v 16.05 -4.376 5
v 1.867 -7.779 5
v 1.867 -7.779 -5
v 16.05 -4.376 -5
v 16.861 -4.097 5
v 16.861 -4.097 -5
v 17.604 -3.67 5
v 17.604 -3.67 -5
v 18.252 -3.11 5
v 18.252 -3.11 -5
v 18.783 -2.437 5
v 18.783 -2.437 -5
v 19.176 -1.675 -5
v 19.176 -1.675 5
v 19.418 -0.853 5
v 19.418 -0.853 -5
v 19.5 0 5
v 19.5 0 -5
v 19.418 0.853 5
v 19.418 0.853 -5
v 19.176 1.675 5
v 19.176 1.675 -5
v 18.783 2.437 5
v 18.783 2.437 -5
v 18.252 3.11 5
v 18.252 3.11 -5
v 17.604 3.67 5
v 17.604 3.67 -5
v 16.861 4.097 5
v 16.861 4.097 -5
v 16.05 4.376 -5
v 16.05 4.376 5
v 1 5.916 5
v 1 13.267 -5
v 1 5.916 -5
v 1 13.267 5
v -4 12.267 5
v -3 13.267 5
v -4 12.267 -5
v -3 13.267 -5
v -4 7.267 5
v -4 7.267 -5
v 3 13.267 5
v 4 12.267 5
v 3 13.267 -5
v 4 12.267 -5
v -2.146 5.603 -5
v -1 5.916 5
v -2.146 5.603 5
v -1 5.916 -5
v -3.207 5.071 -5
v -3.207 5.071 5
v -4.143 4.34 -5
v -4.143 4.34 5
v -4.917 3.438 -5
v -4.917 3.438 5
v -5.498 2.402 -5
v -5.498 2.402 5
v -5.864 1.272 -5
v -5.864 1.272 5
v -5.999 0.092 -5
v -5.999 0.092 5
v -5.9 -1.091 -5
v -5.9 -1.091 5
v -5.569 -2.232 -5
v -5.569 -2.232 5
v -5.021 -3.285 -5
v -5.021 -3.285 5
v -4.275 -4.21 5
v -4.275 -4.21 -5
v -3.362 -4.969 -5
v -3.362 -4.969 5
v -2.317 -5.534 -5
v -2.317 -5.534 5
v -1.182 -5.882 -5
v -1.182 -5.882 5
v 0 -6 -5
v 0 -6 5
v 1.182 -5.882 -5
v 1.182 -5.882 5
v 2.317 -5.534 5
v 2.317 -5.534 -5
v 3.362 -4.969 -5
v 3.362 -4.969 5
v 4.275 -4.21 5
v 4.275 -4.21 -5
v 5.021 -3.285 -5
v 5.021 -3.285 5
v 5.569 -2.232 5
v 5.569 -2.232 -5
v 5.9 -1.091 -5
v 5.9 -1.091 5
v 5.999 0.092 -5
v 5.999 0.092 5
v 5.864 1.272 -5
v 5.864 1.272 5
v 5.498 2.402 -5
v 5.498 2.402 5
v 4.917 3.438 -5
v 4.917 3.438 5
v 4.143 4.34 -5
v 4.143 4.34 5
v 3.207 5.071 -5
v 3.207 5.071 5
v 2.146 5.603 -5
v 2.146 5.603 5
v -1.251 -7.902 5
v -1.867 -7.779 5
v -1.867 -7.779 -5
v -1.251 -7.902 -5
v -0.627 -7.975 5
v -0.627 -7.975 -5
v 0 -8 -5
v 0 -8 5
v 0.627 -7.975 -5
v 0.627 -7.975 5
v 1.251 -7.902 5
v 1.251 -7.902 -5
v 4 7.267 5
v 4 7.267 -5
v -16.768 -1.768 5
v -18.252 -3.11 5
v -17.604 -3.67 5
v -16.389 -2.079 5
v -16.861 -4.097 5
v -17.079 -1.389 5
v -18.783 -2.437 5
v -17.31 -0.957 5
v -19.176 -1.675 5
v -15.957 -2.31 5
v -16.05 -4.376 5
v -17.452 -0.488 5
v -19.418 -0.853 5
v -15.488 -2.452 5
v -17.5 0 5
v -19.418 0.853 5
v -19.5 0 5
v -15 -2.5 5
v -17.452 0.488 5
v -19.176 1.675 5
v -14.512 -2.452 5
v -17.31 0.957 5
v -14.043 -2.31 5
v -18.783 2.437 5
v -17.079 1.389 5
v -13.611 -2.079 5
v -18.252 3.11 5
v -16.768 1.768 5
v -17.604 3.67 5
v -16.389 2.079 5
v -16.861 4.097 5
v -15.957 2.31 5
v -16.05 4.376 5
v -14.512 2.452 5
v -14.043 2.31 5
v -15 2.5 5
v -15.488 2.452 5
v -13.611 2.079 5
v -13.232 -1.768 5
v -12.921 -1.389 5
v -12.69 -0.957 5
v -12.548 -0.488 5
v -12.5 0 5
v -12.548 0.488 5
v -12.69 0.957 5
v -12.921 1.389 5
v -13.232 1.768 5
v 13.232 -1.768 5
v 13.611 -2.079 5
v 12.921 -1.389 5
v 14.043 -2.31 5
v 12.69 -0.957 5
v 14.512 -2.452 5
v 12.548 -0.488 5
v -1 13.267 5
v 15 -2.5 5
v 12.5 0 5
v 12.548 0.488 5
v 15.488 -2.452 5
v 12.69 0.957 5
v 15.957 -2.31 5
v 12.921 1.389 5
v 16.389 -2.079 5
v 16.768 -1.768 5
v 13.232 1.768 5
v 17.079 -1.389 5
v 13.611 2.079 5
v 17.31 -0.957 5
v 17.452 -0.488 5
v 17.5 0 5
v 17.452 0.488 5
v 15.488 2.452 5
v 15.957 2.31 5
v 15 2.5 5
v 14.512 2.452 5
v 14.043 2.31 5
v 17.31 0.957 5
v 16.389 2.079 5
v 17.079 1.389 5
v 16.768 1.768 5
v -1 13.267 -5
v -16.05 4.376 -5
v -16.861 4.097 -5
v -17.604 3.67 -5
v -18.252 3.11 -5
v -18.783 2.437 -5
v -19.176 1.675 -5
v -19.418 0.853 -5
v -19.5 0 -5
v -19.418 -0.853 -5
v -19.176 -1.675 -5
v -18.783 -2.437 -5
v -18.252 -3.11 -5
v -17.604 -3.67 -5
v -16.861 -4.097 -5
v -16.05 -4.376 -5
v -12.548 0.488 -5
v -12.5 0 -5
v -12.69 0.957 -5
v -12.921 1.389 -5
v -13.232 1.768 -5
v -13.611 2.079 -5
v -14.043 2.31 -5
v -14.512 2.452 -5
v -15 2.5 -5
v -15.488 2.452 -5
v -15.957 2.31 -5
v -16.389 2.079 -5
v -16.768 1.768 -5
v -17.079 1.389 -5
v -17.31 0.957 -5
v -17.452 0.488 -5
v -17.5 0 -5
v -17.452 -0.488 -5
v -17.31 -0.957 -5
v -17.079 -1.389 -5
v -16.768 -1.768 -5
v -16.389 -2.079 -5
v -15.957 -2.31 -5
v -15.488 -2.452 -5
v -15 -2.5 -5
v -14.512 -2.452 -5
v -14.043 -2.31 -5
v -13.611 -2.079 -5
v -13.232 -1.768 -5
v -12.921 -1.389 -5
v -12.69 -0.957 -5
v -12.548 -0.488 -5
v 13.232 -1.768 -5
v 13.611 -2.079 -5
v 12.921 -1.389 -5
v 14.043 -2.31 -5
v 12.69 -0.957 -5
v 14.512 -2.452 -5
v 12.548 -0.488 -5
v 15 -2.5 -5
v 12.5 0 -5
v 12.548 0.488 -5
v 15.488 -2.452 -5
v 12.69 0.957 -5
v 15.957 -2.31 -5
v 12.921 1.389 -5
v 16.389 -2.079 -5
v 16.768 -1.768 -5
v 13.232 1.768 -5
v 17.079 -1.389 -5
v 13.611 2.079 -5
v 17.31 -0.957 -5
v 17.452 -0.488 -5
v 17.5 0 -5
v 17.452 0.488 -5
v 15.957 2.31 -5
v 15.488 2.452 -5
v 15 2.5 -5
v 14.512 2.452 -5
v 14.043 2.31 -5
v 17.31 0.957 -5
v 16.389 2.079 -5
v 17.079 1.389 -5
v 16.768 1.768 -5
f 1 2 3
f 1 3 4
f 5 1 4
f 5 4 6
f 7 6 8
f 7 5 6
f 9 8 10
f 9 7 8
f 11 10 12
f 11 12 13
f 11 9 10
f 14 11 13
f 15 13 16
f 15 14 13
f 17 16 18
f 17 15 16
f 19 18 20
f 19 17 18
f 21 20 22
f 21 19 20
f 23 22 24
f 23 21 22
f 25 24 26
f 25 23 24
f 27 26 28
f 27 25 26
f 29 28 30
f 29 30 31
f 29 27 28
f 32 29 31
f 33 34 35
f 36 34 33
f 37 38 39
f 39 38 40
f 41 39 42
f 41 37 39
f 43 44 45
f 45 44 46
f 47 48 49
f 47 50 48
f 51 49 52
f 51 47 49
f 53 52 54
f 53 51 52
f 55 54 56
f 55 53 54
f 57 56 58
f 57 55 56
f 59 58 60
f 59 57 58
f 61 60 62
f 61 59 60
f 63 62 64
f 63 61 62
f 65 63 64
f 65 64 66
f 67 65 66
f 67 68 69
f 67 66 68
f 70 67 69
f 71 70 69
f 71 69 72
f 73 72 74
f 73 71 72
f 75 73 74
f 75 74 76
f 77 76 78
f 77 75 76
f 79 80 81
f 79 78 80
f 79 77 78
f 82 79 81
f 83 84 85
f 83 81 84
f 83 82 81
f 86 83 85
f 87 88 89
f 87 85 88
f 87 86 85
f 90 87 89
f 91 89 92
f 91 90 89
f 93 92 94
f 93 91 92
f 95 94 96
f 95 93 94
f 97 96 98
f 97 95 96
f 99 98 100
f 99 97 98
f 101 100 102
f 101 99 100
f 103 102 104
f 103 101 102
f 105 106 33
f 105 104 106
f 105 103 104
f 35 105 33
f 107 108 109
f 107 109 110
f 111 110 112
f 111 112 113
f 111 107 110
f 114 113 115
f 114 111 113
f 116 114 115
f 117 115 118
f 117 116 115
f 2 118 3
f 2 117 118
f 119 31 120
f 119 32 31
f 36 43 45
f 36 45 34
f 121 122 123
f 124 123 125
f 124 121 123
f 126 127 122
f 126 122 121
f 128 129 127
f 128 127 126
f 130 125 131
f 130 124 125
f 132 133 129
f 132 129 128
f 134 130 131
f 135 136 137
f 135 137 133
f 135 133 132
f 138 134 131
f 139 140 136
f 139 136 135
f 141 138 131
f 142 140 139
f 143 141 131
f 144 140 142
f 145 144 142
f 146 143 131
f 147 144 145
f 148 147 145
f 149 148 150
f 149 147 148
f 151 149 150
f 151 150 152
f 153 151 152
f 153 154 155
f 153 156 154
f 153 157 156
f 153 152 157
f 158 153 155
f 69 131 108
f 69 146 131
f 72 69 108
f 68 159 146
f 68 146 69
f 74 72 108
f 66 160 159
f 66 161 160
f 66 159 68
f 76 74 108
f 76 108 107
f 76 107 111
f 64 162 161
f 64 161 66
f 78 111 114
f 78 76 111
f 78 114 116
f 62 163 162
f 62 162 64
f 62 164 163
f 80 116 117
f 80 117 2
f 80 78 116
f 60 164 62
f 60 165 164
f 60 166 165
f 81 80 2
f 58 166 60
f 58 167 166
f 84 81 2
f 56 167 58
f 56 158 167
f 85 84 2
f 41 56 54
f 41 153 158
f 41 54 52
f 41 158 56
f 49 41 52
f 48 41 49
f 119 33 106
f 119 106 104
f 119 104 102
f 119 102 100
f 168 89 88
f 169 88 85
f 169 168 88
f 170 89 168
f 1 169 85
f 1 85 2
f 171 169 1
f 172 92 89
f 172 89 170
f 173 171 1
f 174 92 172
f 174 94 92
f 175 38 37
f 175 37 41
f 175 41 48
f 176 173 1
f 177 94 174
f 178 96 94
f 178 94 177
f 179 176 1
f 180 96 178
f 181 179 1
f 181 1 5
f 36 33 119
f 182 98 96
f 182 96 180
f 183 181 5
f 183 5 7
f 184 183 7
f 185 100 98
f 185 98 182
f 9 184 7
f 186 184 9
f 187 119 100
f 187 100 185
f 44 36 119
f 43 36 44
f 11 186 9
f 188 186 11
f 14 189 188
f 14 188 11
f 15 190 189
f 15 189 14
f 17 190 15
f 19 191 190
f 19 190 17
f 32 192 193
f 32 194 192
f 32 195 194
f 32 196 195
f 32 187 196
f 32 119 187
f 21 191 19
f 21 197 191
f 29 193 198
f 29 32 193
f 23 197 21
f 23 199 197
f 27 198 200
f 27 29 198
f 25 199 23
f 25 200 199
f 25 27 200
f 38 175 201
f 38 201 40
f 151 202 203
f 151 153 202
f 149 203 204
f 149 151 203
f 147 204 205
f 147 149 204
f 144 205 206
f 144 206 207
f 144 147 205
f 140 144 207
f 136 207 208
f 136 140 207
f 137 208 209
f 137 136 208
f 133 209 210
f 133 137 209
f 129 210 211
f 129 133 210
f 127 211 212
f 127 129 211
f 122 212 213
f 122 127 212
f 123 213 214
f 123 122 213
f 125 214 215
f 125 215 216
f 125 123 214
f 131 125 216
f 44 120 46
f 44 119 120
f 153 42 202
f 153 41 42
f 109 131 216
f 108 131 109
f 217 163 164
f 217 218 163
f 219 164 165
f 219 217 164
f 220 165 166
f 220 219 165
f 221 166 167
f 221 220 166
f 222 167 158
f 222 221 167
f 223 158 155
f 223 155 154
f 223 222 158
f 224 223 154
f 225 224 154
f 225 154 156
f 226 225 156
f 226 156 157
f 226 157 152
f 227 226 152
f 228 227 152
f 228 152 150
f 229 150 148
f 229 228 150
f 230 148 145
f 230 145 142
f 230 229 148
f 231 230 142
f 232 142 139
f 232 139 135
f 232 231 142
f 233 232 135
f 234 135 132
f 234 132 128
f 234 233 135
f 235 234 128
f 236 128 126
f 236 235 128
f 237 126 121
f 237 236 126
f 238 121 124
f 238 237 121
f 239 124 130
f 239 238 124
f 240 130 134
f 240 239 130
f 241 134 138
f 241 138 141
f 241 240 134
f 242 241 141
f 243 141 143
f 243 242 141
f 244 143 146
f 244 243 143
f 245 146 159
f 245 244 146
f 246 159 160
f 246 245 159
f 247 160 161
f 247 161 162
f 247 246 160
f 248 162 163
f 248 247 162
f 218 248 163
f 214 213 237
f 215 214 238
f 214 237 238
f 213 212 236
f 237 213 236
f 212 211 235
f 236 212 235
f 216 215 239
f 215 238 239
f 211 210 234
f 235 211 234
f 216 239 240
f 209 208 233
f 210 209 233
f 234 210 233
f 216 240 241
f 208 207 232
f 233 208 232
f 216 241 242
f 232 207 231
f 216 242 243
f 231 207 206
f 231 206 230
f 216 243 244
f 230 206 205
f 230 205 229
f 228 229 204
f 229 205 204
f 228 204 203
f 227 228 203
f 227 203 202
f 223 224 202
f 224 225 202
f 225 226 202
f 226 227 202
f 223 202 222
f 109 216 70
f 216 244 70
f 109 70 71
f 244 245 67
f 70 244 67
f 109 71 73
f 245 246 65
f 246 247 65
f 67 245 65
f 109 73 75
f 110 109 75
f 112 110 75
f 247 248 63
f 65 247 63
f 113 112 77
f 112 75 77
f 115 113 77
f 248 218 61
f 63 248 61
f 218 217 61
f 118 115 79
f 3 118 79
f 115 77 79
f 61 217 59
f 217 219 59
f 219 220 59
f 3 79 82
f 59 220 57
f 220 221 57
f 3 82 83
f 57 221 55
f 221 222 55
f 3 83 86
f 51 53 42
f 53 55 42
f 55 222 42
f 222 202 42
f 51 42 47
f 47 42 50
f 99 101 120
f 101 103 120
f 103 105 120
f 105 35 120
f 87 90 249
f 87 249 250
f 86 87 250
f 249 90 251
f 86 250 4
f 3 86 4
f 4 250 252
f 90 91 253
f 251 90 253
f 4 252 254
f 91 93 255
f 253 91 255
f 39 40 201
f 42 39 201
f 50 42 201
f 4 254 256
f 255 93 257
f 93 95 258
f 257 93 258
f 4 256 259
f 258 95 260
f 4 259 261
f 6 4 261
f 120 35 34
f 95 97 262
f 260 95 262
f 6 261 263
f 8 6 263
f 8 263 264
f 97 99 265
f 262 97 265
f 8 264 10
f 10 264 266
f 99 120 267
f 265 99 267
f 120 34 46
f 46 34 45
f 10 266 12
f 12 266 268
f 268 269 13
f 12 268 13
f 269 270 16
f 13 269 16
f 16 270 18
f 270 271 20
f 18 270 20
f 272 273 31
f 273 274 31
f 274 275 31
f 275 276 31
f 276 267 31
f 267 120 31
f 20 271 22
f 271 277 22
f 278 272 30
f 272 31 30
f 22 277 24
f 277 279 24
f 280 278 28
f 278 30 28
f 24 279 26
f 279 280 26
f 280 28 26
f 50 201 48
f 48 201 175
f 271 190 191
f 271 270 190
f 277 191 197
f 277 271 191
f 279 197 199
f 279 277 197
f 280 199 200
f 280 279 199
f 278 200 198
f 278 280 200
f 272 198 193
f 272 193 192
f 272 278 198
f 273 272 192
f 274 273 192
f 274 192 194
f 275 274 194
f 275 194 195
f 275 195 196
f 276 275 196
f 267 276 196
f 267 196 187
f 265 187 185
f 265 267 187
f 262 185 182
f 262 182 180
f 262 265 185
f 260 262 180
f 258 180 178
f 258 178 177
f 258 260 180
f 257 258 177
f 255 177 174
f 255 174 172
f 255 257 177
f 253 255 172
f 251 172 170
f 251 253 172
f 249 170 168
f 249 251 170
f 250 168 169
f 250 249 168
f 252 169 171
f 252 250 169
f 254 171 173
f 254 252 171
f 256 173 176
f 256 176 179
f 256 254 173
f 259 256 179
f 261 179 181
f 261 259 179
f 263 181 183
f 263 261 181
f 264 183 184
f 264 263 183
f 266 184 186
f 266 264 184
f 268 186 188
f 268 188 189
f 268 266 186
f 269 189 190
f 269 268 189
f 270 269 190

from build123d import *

# Parameters (mm, degrees)
F0_R     = 2.5
F0_R_2   = 6
F1_DEPTH = 5
F2_W     = 2
F2_H     = 10
F3_DEPTH = 7.3521866209
F4_SIZE  = 1


with BuildPart() as f1:
    # F0 (on Top) → F1 (new body, symmetric)
    with BuildSketch(Plane.XY):
        with BuildLine():
            ThreePointArc((-16.05, 4.3757856437), (-19.5, 0), (-16.05, -4.3757856437))
            Line((-16.05, -4.3757856437), (-1.8666666667, -7.7791744778))
            ThreePointArc((-1.8666666667, -7.7791744778), (-0.9398415233, -7.9446018095), (0, -8))
            ThreePointArc((0, -8), (0.9398415233, -7.9446018095), (1.8666666667, -7.7791744778))
            Line((1.8666666667, -7.7791744778), (16.05, -4.3757856437))
            ThreePointArc((16.05, -4.3757856437), (19.5, 0), (16.05, 4.3757856437))
            Line((16.05, 4.3757856437), (4, 7.267266404))
            Line((4, 7.267266404), (4, 13.267266404))
            Line((4, 13.267266404), (0, 13.267266404))
            Line((0, 13.267266404), (-4, 13.267266404))
            Line((-4, 13.267266404), (-4, 7.267266404))
            Line((-4, 7.267266404), (-16.05, 4.3757856437))
        make_face()
        with Locations((-15, 0)):
            Circle(F0_R, mode=Mode.SUBTRACT)
        Circle(F0_R_2, mode=Mode.SUBTRACT)
        with Locations((15, 0)):
            Circle(F0_R, mode=Mode.SUBTRACT)
    extrude(amount=F1_DEPTH, both=True)

    # F2 (on face) → F3 (cut, through all)
    with BuildSketch(Plane(origin=(0, 13.267266404, 0), x_dir=(-1, 0, 0), z_dir=(0, 1, 0))):
        Rectangle(F2_W, F2_H)
    extrude(amount=-F3_DEPTH, mode=Mode.SUBTRACT)

    # F4
    f4_edges = [f1.edges().sort_by_distance(p)[0] for p in [
        (-4, 13.267266, 0),
        (4, 13.267266, 0),
    ]]
    chamfer(f4_edges, length=F4_SIZE)


solid = f1.part
